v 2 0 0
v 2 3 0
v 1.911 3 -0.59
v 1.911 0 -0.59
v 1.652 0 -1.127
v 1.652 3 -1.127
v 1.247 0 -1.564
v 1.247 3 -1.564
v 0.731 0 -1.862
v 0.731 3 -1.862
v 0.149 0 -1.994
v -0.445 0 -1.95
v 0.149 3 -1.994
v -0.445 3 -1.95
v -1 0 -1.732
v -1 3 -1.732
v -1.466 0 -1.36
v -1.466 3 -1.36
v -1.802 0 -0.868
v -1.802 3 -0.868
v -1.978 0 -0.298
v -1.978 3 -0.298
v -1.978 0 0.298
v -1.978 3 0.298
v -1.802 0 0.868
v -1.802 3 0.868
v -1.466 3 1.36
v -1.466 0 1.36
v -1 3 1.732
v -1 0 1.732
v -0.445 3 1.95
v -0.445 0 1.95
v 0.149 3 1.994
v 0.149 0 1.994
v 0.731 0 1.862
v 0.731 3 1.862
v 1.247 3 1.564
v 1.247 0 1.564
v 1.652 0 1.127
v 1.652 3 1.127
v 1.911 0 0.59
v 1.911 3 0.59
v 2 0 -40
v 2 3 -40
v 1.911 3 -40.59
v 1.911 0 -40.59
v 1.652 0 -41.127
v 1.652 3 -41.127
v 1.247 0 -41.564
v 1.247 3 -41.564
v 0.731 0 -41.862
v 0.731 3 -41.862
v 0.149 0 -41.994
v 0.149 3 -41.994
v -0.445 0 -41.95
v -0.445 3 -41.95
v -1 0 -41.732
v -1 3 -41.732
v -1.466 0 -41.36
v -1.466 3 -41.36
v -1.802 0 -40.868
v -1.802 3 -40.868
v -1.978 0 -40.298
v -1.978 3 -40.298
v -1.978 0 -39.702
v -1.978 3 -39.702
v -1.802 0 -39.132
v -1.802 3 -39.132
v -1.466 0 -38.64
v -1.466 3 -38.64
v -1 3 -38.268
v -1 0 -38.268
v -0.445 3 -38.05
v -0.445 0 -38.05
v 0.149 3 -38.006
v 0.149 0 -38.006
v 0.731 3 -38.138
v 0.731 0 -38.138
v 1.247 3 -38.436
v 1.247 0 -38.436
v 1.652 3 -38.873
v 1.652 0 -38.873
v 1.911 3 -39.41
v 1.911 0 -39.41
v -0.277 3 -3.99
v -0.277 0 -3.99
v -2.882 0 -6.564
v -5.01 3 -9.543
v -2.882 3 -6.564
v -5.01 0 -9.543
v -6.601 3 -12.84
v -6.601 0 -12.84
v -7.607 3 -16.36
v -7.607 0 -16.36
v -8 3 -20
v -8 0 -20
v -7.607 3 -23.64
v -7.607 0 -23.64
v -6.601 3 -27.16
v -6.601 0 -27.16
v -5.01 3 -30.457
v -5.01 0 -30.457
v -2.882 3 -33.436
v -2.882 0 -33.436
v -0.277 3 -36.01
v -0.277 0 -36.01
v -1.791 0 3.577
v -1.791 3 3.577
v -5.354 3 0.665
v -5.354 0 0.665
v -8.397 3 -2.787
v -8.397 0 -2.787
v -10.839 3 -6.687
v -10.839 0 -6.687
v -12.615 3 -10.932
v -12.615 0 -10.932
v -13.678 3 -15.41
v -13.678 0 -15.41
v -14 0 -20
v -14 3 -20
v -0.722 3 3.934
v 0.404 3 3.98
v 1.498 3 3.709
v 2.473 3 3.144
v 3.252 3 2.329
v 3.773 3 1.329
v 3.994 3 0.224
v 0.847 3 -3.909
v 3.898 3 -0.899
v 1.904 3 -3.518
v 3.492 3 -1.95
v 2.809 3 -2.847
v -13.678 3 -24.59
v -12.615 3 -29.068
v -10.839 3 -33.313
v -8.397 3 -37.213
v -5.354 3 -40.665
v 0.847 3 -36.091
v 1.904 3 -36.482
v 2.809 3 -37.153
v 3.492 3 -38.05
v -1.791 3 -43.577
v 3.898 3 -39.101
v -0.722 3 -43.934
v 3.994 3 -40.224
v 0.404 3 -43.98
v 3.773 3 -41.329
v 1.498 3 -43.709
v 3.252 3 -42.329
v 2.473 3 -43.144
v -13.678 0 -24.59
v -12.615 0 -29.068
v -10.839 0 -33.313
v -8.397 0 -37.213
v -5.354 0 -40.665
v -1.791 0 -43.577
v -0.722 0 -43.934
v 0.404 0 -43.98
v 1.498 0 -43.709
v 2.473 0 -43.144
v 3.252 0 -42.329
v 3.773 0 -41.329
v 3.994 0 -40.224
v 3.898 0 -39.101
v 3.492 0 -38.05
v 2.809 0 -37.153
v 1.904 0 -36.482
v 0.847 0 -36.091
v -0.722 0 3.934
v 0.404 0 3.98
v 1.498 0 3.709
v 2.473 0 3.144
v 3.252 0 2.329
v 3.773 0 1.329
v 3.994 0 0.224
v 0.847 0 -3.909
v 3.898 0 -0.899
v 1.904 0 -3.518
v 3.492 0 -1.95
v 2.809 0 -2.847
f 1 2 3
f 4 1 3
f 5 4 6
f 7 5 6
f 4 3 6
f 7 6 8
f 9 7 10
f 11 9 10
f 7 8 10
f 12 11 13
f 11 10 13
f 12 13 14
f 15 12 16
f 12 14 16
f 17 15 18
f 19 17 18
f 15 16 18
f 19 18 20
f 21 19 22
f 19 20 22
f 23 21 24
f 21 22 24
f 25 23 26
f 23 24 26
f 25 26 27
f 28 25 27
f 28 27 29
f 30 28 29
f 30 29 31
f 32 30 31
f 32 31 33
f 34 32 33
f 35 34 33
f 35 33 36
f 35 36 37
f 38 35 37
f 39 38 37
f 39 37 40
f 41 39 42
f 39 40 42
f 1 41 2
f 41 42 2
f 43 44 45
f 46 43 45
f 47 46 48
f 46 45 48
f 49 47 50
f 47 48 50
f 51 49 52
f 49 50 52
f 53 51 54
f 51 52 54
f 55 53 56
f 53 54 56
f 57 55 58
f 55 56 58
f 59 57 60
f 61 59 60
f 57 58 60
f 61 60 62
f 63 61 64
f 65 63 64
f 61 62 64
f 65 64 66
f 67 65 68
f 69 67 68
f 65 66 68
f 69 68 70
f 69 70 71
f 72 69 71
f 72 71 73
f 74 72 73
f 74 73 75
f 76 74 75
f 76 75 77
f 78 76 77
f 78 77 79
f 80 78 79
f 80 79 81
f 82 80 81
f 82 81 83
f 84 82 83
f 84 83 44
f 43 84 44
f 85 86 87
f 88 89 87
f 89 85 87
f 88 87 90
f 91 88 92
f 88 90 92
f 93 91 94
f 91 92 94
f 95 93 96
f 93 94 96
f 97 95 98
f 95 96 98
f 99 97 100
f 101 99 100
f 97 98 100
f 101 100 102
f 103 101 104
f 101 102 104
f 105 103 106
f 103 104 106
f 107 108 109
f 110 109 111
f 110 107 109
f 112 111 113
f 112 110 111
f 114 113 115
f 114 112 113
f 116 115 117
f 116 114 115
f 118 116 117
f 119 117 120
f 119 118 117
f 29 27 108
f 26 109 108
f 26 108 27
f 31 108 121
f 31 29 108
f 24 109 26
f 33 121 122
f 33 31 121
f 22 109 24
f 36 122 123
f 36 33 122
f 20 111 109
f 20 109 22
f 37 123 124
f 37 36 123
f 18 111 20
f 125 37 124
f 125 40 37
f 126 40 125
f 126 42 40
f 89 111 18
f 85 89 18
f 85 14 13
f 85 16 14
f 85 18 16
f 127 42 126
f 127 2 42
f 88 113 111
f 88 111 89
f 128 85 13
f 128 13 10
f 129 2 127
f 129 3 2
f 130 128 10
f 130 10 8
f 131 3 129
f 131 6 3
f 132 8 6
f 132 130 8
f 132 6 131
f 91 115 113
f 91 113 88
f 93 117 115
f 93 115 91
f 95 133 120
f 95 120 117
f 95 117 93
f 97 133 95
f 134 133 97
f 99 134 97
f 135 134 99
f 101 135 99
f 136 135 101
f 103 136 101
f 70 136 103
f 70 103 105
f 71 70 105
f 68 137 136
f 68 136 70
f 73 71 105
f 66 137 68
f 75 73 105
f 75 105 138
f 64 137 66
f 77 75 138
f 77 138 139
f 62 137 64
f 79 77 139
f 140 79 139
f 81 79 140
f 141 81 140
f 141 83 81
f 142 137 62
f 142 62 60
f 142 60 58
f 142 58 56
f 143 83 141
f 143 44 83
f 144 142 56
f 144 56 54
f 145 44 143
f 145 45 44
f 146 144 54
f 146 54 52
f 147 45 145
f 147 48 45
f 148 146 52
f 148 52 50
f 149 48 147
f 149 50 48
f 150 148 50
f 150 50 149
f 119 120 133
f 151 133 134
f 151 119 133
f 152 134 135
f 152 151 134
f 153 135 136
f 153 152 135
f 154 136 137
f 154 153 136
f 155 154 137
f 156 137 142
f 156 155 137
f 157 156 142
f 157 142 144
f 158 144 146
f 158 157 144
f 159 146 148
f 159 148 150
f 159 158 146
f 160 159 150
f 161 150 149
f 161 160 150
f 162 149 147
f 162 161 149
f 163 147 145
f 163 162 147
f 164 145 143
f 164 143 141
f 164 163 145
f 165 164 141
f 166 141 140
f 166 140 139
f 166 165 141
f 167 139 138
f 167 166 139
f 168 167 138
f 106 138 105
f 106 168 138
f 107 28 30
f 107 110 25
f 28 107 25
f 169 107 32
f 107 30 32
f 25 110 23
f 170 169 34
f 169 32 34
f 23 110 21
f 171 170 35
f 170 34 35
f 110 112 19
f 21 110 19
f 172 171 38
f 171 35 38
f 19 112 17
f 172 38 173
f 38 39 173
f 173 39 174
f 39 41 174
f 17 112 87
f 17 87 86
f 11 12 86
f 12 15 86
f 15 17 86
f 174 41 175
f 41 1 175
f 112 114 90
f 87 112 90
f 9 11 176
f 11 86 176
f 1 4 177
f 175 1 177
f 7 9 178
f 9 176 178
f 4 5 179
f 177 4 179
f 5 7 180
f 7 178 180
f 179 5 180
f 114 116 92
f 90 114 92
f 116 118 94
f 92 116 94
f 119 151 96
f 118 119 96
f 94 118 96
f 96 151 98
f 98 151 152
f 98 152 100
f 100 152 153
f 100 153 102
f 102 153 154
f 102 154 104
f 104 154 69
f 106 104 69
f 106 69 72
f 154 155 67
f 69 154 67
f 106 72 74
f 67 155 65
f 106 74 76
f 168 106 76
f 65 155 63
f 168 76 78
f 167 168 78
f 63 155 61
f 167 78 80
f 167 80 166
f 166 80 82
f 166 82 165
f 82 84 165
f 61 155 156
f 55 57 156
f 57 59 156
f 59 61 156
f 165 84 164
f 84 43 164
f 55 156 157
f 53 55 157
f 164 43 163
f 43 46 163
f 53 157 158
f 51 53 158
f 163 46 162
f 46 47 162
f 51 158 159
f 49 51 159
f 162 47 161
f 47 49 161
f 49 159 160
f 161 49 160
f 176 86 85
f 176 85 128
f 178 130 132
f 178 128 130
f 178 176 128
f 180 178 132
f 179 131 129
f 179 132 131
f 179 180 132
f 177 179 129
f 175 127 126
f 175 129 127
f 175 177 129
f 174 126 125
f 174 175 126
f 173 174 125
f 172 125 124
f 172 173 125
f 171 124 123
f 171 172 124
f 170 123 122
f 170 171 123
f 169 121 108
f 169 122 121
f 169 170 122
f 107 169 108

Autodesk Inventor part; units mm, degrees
ref_plane "YZ Plane" through (0, 0, 0) normal (1, 0, 0) x (0, 1, 0)
ref_plane "XZ Plane" through (0, 0, 0) normal (0, 1, 0) x (-1, 0, 0)
ref_plane "XY Plane" through (0, 0, 0) normal (0, 0, 1) x (1, 0, 0)
sketch "Эскиз3" plane through (0, 0, 0) normal (0, 1, 0) x (-1, 0, 0)
  arc A0 (1.791, 3.5766) -> (0.2774, -3.9904) centre (0, 0) ccw
  arc A1 (14, -20) -> (1.791, 3.5766) centre (-14.2382, -19.6735) ccw
  arc A2 (8, -20) -> (0.2774, -3.9904) centre (-13.4368, -20.4731) ccw
  line L0 (8, -20) -> (14, -20)
  line L1 (0, 0) -> (13.752, 0)
  dimension "d12" = 8
  dimension "d27" = 8
  dimension "d29" = 20
  dimension "d30" = 6
extrude "Выдавливание5" add sketch "Эскиз3" along normal blind 3
sketch "Эскиз5" plane through (0, 3, 0) normal (0, 1, 0) x (1, 0, 0)
  circle A0 centre (0, 0) radius 2
  dimension "d24" = 4
extrude "Выдавливание6" cut sketch "Эскиз5" against normal blind 10
mirror "Зеркальное отражение1" about plane through (-8, 0, -20) normal (0, 0, -1) of "Выдавливание5", "Выдавливание6"
properties part number "000.703 - Тяга" material "Пластик АБС"
